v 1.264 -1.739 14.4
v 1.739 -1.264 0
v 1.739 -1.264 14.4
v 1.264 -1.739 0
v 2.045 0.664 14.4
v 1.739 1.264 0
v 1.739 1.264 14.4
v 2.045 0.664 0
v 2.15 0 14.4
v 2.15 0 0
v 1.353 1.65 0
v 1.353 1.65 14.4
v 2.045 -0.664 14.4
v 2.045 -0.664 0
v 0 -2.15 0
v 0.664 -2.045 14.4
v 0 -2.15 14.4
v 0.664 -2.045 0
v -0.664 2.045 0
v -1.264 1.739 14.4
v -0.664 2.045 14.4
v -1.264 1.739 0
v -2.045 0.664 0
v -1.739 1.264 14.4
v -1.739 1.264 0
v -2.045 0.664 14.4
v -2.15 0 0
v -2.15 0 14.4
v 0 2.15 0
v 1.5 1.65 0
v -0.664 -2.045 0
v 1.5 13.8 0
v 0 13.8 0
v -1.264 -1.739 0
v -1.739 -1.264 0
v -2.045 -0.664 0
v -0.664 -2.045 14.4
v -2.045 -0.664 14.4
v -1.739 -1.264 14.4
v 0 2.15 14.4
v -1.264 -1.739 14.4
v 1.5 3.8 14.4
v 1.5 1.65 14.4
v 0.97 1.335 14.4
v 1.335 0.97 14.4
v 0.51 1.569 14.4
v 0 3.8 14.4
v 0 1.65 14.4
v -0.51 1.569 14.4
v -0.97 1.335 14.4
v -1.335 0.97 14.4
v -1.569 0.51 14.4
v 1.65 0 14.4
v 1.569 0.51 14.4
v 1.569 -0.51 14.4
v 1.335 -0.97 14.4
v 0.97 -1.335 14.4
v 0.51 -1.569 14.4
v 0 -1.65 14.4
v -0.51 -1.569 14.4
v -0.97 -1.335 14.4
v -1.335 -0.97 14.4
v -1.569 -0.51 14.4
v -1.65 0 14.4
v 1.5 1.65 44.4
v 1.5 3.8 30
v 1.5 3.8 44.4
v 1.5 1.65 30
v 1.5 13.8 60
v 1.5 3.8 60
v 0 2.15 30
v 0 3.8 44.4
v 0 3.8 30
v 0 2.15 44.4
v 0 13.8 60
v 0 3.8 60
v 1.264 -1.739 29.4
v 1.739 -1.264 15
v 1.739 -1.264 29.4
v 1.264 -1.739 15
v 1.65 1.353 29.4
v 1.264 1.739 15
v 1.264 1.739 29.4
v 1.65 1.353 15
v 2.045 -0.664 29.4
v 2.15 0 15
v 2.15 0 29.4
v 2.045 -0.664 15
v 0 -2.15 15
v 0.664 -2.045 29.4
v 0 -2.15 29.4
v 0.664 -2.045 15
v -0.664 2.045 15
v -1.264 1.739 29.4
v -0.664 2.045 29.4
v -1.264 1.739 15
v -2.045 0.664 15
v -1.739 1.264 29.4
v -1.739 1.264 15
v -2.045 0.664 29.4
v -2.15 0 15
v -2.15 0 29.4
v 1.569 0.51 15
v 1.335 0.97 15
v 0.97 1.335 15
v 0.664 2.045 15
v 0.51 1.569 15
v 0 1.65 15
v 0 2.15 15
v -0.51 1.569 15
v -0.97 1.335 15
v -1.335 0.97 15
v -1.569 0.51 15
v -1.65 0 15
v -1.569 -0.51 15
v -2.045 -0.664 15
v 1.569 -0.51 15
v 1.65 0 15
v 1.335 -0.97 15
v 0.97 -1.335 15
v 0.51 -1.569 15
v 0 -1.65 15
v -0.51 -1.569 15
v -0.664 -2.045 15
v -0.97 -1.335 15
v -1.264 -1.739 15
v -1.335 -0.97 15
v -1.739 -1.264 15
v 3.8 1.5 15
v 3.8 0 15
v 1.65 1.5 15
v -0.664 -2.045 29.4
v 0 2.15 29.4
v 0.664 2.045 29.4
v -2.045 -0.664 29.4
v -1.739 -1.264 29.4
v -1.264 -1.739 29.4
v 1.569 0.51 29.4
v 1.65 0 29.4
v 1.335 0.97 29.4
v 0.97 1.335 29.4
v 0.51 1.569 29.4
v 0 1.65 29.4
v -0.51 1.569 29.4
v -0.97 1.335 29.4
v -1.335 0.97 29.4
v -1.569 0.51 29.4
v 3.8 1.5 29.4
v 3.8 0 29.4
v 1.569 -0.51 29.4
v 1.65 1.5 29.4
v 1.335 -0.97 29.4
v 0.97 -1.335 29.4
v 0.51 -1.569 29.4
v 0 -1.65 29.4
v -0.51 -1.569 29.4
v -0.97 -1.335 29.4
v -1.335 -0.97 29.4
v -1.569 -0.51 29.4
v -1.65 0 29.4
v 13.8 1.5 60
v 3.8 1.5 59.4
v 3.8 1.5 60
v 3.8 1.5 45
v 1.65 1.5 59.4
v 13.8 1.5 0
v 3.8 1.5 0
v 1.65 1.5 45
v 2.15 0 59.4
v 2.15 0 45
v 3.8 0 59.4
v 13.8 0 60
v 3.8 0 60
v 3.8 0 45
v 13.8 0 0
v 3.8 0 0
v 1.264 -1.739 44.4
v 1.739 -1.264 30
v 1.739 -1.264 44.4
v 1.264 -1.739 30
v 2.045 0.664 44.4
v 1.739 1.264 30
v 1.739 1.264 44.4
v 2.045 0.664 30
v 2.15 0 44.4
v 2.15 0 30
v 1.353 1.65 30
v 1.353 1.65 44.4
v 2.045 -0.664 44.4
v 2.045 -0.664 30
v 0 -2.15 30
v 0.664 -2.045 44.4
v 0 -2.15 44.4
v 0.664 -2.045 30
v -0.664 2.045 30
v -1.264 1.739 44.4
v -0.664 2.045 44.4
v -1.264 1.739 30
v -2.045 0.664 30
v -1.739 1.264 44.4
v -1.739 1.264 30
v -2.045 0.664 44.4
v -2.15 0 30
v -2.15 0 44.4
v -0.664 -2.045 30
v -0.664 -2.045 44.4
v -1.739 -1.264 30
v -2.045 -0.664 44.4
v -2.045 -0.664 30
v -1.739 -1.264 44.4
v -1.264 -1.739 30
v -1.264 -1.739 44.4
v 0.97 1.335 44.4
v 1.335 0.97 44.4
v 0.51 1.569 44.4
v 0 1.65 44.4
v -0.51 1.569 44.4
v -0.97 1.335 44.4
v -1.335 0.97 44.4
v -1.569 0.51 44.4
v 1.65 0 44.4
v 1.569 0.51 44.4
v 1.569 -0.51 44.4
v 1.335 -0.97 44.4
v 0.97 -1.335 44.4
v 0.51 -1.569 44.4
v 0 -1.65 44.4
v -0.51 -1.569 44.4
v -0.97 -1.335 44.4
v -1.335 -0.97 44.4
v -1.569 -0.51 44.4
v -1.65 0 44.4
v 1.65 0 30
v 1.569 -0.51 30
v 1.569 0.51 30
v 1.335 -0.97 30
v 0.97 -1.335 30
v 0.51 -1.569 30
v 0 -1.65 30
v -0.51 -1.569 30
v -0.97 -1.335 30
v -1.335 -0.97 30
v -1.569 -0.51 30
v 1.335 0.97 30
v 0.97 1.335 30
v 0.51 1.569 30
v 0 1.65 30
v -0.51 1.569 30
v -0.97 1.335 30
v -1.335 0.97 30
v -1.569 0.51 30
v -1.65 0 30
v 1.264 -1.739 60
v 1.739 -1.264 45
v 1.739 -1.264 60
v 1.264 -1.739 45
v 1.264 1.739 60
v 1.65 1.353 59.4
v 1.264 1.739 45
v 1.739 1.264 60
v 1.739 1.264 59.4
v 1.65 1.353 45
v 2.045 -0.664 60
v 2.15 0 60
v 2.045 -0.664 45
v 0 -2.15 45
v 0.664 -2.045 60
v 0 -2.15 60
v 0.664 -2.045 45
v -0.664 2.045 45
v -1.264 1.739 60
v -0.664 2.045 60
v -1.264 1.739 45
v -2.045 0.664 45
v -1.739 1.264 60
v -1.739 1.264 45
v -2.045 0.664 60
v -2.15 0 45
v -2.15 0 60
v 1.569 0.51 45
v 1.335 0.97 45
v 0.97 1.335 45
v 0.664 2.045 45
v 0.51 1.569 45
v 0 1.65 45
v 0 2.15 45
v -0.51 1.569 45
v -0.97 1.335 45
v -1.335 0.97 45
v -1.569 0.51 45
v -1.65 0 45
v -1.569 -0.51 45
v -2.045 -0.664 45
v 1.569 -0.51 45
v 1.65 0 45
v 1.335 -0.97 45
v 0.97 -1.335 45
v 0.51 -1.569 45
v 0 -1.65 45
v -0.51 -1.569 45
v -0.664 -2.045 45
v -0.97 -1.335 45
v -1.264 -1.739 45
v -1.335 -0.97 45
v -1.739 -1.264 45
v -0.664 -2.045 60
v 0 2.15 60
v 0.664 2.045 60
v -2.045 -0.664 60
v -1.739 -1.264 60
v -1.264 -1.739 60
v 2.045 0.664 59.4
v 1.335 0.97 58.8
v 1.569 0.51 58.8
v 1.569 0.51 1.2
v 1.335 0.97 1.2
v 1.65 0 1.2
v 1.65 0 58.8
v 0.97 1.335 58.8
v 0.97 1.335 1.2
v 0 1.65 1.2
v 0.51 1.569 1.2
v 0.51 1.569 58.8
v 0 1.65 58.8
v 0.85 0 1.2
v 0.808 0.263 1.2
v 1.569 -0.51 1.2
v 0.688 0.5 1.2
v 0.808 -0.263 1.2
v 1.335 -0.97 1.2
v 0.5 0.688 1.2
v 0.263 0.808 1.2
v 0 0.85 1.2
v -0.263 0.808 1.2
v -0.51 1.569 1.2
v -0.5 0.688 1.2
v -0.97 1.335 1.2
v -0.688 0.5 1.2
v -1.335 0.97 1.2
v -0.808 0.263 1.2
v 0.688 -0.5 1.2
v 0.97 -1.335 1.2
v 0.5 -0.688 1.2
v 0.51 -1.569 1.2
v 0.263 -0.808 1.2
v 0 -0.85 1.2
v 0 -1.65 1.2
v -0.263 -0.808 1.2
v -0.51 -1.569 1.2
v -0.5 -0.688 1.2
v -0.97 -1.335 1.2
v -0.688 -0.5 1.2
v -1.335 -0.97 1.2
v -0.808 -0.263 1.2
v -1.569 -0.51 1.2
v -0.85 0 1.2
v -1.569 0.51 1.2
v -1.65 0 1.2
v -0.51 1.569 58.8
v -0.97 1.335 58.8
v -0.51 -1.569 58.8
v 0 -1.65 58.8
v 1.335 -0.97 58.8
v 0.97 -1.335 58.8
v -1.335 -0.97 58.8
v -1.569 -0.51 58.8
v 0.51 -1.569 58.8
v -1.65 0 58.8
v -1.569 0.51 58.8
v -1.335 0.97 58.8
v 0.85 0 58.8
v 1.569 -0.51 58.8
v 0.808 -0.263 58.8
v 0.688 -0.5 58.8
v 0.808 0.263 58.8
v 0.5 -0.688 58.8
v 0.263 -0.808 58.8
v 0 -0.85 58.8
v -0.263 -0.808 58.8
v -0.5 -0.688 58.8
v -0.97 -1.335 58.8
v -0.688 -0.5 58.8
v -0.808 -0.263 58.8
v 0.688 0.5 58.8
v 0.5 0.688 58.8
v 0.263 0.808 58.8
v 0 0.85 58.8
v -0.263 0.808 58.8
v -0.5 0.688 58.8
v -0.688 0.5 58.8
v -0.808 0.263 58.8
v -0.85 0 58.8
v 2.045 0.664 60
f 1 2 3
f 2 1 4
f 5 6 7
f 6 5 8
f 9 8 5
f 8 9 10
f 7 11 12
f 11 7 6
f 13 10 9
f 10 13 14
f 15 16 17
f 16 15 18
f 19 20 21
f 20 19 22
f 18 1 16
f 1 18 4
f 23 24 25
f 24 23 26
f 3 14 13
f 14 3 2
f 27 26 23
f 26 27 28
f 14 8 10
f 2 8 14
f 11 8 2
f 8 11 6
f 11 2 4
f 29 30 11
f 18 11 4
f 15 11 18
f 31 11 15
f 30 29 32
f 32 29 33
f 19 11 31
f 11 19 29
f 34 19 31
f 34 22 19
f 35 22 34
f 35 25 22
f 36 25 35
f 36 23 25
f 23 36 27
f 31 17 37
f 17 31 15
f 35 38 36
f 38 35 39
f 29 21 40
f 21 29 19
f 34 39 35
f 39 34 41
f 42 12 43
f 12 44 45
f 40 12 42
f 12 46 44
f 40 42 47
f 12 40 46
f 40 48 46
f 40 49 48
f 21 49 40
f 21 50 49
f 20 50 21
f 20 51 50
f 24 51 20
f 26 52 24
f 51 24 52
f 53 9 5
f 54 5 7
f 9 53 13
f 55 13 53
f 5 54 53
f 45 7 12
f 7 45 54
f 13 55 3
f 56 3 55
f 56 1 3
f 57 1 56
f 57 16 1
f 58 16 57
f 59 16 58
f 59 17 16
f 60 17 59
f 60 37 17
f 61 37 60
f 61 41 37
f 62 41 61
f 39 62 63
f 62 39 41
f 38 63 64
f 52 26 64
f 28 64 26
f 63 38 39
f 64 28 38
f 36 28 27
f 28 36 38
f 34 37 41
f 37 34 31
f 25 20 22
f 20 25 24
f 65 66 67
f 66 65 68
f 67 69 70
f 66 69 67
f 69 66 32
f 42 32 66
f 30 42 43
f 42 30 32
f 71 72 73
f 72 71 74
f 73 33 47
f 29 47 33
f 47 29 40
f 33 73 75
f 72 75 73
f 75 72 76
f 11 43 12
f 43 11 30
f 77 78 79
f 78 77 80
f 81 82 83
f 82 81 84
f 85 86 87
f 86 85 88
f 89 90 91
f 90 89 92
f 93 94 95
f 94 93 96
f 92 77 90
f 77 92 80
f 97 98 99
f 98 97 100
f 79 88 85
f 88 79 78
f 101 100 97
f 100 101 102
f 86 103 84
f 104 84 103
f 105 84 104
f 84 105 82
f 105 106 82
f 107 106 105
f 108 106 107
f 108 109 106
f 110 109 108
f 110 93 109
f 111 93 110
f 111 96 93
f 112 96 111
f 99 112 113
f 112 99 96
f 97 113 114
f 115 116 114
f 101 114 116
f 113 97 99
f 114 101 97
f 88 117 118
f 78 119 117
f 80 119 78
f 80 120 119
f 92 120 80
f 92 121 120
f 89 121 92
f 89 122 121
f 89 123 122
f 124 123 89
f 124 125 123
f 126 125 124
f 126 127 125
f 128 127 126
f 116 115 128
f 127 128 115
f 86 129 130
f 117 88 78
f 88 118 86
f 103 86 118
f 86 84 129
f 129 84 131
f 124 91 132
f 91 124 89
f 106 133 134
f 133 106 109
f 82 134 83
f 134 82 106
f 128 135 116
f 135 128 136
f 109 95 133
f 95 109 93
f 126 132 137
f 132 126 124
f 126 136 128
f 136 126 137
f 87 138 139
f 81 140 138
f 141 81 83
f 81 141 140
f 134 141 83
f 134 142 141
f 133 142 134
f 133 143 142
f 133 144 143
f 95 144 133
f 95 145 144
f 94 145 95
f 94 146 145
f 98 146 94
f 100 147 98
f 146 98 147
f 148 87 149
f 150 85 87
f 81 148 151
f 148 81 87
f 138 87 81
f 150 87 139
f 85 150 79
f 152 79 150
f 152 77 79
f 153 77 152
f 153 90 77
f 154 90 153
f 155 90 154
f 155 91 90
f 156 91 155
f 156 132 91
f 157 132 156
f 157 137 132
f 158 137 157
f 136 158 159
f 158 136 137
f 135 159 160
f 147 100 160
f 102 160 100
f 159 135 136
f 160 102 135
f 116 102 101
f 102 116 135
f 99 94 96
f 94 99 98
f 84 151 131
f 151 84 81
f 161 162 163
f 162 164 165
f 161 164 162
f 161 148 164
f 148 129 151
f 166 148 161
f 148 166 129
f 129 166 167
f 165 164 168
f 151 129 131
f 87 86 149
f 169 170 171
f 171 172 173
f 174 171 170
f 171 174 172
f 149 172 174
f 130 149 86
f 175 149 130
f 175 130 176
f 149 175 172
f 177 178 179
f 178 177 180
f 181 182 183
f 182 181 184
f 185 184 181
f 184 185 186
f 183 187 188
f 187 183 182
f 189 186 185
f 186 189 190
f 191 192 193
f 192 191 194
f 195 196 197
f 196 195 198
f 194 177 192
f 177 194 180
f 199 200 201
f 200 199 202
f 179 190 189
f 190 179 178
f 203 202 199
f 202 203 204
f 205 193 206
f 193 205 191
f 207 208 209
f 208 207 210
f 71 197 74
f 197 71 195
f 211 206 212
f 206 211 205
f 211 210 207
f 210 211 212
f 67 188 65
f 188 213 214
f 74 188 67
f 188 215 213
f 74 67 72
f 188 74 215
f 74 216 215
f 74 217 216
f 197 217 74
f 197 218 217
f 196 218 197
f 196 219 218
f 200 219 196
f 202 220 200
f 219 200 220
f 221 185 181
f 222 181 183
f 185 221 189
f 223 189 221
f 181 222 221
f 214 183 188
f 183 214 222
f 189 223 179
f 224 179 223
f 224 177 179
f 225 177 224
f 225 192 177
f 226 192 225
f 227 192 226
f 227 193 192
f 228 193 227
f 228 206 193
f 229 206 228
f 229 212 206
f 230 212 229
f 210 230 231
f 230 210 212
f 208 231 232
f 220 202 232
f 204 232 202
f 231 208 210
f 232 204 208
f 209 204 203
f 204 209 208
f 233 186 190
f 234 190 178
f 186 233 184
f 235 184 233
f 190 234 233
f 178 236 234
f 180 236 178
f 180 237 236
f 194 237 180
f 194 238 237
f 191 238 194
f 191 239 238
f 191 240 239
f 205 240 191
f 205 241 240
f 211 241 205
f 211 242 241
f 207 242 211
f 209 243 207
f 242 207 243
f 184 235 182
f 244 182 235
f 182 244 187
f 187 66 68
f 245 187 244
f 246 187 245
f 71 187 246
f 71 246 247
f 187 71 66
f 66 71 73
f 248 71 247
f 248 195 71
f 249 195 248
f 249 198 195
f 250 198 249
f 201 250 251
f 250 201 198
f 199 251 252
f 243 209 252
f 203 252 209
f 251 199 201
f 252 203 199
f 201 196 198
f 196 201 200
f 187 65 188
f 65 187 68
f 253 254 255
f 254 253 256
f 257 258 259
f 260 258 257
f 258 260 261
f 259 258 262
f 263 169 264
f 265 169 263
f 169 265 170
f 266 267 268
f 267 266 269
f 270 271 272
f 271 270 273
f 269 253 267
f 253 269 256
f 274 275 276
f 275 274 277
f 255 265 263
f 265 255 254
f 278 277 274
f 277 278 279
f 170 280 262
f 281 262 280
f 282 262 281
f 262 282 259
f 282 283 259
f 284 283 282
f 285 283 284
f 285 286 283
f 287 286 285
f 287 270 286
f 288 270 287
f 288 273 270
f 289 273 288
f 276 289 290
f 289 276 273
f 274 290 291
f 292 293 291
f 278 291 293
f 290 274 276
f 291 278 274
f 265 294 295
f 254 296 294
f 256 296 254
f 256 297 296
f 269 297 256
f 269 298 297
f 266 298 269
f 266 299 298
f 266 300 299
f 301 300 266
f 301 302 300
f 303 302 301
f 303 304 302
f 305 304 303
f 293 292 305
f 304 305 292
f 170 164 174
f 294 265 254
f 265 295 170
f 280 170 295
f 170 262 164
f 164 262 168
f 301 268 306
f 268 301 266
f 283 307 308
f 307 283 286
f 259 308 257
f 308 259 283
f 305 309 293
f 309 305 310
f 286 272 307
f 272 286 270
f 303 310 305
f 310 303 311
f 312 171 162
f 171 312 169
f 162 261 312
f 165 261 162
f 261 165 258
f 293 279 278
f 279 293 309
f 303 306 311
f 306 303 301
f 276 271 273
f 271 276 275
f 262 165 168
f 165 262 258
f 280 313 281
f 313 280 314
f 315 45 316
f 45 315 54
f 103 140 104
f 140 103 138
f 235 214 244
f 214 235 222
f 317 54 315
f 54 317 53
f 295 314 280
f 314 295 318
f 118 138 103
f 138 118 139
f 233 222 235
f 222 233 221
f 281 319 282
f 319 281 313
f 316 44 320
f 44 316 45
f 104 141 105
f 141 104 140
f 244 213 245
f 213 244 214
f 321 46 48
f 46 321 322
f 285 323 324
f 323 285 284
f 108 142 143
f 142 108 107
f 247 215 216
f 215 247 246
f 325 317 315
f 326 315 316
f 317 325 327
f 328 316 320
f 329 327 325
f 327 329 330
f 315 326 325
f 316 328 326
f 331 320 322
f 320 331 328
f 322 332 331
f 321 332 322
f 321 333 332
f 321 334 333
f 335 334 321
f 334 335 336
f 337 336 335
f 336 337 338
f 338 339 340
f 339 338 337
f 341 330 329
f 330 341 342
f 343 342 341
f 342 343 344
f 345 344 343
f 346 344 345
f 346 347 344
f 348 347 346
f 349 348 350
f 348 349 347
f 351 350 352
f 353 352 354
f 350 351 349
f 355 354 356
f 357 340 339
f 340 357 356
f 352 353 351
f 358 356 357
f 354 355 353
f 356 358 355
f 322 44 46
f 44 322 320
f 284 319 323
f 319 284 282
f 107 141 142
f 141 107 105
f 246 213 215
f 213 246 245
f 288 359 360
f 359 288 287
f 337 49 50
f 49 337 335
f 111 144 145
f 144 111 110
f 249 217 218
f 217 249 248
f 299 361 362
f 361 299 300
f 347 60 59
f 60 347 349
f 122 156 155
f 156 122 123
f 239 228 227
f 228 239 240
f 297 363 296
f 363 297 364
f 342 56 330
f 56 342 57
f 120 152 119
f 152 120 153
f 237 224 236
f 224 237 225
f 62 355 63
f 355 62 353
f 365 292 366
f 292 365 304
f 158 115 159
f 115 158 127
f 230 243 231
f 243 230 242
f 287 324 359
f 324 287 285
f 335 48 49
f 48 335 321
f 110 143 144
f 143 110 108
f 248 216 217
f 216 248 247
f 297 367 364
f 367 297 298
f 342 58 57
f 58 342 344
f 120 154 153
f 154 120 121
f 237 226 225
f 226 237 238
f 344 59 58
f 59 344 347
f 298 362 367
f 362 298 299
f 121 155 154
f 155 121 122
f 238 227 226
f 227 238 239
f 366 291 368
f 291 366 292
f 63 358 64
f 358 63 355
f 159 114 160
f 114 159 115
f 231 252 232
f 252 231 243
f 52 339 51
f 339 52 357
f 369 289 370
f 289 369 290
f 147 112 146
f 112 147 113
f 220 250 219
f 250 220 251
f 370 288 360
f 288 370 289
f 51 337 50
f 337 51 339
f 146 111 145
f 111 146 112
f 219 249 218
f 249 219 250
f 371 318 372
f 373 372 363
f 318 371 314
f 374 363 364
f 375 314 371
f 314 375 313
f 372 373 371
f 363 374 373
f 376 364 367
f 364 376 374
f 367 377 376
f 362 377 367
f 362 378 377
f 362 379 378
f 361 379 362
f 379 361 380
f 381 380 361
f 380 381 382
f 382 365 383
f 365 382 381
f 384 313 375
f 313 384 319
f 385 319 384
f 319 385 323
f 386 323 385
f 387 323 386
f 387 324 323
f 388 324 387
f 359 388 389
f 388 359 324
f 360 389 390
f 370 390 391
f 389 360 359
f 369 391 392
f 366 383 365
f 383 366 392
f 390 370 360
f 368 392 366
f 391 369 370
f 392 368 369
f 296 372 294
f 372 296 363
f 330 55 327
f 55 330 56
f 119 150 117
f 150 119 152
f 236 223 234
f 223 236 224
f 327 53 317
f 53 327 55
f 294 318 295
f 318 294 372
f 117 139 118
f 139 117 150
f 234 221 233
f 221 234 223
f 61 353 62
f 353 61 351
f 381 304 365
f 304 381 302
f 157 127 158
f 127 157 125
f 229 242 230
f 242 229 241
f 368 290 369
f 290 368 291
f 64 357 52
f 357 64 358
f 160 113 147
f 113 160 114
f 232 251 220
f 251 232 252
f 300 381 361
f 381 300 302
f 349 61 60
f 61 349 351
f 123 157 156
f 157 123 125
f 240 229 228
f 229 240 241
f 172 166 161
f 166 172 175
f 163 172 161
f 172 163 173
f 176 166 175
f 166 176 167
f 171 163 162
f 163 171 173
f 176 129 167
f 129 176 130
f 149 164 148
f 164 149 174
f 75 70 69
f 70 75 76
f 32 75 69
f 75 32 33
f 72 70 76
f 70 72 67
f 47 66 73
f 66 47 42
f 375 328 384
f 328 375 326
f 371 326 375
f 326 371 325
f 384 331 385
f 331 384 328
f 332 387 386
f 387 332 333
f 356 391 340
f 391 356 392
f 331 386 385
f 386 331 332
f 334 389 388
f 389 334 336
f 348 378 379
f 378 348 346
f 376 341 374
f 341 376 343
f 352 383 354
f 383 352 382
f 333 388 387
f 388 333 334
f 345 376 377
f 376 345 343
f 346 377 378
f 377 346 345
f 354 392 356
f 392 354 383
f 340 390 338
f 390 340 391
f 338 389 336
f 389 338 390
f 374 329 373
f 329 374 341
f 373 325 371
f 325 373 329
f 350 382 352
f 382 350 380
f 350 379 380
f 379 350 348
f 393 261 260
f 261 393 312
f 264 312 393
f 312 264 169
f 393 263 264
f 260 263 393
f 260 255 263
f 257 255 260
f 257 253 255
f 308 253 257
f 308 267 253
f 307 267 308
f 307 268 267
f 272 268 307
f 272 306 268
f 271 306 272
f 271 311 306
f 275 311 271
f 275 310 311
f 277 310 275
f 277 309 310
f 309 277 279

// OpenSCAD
// (mm) Making this bigger will increase the hinge stength.
rodDiameter    = 1.7;  
//  (mm) This needs to be big enough that the rod won't fuse with the hinge tube.
HorizontalGap  = 0.8; 
// (mm) Gap between segments, should be 2 or 3 times the layer height
VerticalGap    = 0.6;  
// (mm) Total height of the hinge
hingeHeight    = 60;  
// Number of segments, should be at least 3
numberOfSegments    = 4;   
// (mm)
tubeThickness  = 0.5; 
// (mm) 
hingeWidth     = 10;
// (mm) Gap between tube and rectangular flap
flangeWidth    = 4;
// (mm) 
hingeThickness = 1.5;

numberOfFacetsInCylinders = 20;

$fn = numberOfFacetsInCylinders;

segmentHeight = hingeHeight/numberOfSegments;
holeRad = rodDiameter/2+HorizontalGap;
tubeRad = holeRad+tubeThickness;

// Hinge body
translate([tubeRad+holeRad,0,0])
cube([hingeWidth,hingeThickness,hingeHeight]);
translate([0,tubeRad+holeRad,0])
cube([hingeThickness,hingeWidth,hingeHeight]);

difference()
{
    // Tube sections and the parts connecting them to the main hinge body
    union()
    {
        for(i = [0:numberOfSegments-1])
        {
            translate([0,0,segmentHeight*i])
            cylinder(r=tubeRad,h=segmentHeight-VerticalGap);
            if(i%2==1)
            {
                translate([holeRad,0,segmentHeight*i])
                cube([flangeWidth,hingeThickness,segmentHeight-VerticalGap]);
            }
            else
            {
                translate([0,holeRad,segmentHeight*i])
                cube([hingeThickness,flangeWidth,segmentHeight-VerticalGap]);
            }               
        }
    }
    translate([0,0,2*VerticalGap])
    cylinder(r=holeRad,h=hingeHeight-4*VerticalGap);
}

// Rod
cylinder(r=rodDiameter/2,h=hingeHeight-2*VerticalGap);

// Close off top 
translate([0,0,hingeHeight-VerticalGap])
cylinder(r=tubeRad,h=VerticalGap);
